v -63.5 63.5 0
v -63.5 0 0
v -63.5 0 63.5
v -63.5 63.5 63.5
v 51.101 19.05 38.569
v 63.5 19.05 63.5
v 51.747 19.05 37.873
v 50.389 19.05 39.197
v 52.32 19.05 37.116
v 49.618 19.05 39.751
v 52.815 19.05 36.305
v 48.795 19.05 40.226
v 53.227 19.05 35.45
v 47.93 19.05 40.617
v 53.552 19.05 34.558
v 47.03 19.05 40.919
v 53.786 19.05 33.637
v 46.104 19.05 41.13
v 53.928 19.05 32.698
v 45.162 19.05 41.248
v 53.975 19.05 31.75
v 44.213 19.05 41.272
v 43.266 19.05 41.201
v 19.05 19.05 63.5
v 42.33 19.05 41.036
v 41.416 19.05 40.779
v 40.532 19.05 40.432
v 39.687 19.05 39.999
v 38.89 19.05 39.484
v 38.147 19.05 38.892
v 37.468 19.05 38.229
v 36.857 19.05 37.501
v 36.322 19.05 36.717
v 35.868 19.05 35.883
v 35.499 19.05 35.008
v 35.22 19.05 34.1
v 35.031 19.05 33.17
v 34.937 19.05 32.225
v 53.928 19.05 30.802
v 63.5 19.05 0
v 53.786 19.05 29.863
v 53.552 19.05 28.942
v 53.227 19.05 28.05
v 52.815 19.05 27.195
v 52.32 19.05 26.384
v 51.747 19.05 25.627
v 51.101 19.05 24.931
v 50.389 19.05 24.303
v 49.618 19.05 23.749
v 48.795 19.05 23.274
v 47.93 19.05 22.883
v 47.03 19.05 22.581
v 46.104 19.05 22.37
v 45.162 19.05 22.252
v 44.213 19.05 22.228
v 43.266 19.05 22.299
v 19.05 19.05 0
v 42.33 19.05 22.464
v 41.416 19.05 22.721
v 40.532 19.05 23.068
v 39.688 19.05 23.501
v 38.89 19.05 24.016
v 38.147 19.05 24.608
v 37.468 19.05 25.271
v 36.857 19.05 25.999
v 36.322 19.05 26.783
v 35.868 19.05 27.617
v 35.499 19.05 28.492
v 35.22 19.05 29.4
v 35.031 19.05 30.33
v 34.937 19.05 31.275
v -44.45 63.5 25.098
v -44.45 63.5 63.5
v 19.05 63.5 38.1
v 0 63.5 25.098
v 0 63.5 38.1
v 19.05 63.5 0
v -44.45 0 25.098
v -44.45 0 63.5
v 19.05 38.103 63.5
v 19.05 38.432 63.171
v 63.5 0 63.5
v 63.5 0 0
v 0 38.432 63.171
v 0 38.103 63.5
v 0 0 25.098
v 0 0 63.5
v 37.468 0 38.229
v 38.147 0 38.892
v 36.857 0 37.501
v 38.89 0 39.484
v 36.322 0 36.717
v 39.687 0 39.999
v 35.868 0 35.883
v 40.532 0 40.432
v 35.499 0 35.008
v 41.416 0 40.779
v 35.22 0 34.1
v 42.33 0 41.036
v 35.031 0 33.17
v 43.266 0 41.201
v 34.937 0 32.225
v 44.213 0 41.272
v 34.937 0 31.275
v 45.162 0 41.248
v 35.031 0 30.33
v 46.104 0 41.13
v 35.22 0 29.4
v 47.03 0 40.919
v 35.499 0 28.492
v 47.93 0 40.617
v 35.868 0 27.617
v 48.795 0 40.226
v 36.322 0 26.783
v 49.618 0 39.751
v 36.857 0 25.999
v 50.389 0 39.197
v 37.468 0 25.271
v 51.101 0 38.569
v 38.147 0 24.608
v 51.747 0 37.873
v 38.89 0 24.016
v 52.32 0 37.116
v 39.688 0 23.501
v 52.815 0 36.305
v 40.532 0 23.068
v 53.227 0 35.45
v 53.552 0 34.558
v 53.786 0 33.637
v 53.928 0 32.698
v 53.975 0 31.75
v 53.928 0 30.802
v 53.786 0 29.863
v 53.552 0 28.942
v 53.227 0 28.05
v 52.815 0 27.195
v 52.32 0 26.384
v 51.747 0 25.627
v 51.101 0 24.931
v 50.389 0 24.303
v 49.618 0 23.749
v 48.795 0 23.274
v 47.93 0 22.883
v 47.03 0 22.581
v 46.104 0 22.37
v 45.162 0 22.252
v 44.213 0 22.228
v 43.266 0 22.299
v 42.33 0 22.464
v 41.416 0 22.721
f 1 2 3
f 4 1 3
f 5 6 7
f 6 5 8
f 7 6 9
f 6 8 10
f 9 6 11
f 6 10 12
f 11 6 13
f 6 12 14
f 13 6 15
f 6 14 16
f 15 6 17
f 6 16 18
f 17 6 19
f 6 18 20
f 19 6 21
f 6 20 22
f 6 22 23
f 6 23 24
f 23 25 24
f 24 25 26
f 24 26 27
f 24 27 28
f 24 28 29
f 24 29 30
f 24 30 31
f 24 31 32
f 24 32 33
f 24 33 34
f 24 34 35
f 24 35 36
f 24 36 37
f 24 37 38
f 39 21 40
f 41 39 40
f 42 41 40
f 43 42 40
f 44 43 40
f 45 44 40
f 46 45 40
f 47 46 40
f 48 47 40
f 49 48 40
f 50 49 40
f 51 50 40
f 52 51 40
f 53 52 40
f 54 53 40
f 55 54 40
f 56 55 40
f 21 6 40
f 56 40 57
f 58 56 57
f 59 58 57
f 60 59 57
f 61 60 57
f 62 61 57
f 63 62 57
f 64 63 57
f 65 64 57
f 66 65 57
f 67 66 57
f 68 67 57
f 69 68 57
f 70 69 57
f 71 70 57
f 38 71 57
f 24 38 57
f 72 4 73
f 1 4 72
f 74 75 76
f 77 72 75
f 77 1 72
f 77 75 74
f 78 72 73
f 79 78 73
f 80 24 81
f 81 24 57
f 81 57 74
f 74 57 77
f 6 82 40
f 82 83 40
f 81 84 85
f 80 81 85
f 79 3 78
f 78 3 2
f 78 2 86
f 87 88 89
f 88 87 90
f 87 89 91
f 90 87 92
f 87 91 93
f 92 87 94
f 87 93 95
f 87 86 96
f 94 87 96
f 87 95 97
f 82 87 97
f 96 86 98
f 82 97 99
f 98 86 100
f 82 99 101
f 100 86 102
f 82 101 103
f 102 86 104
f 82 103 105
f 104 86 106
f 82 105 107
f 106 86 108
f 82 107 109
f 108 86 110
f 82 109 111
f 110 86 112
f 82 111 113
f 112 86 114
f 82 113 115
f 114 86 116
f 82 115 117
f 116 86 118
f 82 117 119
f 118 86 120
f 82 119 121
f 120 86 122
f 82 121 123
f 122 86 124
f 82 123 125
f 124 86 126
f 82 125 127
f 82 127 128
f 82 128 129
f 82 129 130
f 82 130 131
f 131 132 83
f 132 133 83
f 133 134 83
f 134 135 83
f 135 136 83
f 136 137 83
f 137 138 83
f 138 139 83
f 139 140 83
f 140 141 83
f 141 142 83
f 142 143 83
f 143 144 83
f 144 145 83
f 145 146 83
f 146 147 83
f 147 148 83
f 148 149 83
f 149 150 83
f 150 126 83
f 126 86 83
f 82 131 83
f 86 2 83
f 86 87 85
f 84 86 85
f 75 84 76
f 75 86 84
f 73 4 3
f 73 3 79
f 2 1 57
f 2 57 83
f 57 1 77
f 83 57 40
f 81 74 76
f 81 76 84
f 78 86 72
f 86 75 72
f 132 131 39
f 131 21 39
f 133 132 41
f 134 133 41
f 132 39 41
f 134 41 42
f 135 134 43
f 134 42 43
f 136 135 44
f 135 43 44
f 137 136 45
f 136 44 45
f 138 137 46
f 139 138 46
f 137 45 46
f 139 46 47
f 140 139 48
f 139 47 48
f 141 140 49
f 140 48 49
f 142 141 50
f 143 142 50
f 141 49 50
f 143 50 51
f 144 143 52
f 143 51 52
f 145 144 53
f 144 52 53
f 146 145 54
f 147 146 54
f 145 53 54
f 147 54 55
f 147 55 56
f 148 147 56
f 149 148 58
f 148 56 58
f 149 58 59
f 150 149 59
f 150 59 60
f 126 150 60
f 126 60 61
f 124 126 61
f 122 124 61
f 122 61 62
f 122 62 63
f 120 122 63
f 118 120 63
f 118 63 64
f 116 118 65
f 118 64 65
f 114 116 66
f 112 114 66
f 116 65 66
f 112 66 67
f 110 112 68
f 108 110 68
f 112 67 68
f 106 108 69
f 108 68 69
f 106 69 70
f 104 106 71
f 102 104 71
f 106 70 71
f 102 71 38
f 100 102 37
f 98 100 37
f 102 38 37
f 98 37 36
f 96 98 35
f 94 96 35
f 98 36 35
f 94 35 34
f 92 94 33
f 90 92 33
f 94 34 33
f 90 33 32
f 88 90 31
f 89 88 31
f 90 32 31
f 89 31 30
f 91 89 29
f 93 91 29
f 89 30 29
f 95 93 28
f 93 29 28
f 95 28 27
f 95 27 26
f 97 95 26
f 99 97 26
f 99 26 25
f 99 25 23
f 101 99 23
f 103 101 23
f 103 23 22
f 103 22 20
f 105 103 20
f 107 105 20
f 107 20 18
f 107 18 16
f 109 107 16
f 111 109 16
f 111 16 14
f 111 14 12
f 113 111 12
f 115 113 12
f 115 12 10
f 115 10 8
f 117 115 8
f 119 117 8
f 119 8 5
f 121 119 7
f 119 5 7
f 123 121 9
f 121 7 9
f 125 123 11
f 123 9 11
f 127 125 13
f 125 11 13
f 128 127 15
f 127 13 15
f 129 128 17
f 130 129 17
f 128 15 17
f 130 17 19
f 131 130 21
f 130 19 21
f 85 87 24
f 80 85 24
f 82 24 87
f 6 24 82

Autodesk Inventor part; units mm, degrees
ref_plane "YZ Plane" through (0, 0, 0) normal (1, 0, 0) x (0, 1, 0)
ref_plane "XZ Plane" through (0, 0, 0) normal (0, 1, 0) x (-1, 0, 0)
ref_plane "XY Plane" through (0, 0, 0) normal (0, 0, 1) x (1, 0, 0)
sketch "Sketch1" plane through (0, 0, 0) normal (0, 0, 1) x (1, 0, 0)
  line L0 (0, 0) -> (0, 63.5)
  line L1 (0, 63.5) -> (19.05, 63.5)
  line L2 (0, 0) -> (63.5, 0)
  line L3 (63.5, 0) -> (63.5, 19.05)
  line L4 (63.5, 19.05) -> (19.05, 19.05)
  line L5 (19.05, 19.05) -> (19.05, 63.5)
  dimension "d3" = 63.5
  dimension "d6" = 19.05
  dimension "d7" = 63.5
  dimension "d8" = 19.05
  dimension "d9" = 44.45
  dimension "d10" = 44.45
extrude "Extrusion1" add sketch "Sketch1" along normal blind 63.5
sketch "Sketch2" plane through (0, 63.5, 0) normal (0, 1, 0) x (1, 0, 0)
  line L0 (0, 0) -> (-63.5, 0)
  line L1 (-63.5, 0) -> (-63.5, -63.5)
  line L2 (-63.5, -63.5) -> (-44.45, -63.5)
  line L3 (0, 0) -> (0, -63.5) projected
  line L4 (0, -6.0479) -> (0, -25.0979)
  line L5 (0, -25.0979) -> (-44.45, -25.0979)
  line L6 (-44.45, -25.0979) -> (-44.45, -63.5)
  dimension "d19" = 63.5
  dimension "d20" = 63.5
  dimension "d21" = 19.05
  dimension "d22" = 19.05
  dimension "d23" = 38.4021
  dimension "d24" = 44.45
extrude "Extrusion2" add sketch "Sketch2" against normal blind 63.5
sketch "Sketch3" plane through (19.05, 19.05, 0) normal (0, 1, 0) x (1, 0, 0)
  line L0 (44.45, 0) -> (44.45, -63.5) projected
  line L1 (-82.55, 0) -> (44.45, 0) projected
  circle A0 centre (25.4, -31.75) radius 9.525
  point P0 (-19.05, 0)
  dimension "d29" = 19.05
extrude "Extrusion3" cut sketch "Sketch3" along normal blind 63.5 and the other way blind 31.75
sketch "Sketch4" plane through (19.05, 19.05, 0) normal (1, 0, 0) x (0, 0, -1)
  line L0 (-63.5, 44.45) -> (-25.0979, 44.45) projected
  line L1 (-63.5, 44.45) -> (-38.1, 44.45)
  line L2 (-38.1, 44.45) -> (-63.1713, 19.3817)
  line L3 (-63.1713, 19.3817) -> (-63.5, 19.0531)
  line L4 (-63.5, 44.45) -> (-63.5, -19.05) projected
  point P0 (0, -19.05)
  dimension "d34" = 25.4
extrude "Extrusion4" cut sketch "Sketch4" against normal blind 50.8
properties part number "INVENTOR_TUT" material "Polypropylene"
